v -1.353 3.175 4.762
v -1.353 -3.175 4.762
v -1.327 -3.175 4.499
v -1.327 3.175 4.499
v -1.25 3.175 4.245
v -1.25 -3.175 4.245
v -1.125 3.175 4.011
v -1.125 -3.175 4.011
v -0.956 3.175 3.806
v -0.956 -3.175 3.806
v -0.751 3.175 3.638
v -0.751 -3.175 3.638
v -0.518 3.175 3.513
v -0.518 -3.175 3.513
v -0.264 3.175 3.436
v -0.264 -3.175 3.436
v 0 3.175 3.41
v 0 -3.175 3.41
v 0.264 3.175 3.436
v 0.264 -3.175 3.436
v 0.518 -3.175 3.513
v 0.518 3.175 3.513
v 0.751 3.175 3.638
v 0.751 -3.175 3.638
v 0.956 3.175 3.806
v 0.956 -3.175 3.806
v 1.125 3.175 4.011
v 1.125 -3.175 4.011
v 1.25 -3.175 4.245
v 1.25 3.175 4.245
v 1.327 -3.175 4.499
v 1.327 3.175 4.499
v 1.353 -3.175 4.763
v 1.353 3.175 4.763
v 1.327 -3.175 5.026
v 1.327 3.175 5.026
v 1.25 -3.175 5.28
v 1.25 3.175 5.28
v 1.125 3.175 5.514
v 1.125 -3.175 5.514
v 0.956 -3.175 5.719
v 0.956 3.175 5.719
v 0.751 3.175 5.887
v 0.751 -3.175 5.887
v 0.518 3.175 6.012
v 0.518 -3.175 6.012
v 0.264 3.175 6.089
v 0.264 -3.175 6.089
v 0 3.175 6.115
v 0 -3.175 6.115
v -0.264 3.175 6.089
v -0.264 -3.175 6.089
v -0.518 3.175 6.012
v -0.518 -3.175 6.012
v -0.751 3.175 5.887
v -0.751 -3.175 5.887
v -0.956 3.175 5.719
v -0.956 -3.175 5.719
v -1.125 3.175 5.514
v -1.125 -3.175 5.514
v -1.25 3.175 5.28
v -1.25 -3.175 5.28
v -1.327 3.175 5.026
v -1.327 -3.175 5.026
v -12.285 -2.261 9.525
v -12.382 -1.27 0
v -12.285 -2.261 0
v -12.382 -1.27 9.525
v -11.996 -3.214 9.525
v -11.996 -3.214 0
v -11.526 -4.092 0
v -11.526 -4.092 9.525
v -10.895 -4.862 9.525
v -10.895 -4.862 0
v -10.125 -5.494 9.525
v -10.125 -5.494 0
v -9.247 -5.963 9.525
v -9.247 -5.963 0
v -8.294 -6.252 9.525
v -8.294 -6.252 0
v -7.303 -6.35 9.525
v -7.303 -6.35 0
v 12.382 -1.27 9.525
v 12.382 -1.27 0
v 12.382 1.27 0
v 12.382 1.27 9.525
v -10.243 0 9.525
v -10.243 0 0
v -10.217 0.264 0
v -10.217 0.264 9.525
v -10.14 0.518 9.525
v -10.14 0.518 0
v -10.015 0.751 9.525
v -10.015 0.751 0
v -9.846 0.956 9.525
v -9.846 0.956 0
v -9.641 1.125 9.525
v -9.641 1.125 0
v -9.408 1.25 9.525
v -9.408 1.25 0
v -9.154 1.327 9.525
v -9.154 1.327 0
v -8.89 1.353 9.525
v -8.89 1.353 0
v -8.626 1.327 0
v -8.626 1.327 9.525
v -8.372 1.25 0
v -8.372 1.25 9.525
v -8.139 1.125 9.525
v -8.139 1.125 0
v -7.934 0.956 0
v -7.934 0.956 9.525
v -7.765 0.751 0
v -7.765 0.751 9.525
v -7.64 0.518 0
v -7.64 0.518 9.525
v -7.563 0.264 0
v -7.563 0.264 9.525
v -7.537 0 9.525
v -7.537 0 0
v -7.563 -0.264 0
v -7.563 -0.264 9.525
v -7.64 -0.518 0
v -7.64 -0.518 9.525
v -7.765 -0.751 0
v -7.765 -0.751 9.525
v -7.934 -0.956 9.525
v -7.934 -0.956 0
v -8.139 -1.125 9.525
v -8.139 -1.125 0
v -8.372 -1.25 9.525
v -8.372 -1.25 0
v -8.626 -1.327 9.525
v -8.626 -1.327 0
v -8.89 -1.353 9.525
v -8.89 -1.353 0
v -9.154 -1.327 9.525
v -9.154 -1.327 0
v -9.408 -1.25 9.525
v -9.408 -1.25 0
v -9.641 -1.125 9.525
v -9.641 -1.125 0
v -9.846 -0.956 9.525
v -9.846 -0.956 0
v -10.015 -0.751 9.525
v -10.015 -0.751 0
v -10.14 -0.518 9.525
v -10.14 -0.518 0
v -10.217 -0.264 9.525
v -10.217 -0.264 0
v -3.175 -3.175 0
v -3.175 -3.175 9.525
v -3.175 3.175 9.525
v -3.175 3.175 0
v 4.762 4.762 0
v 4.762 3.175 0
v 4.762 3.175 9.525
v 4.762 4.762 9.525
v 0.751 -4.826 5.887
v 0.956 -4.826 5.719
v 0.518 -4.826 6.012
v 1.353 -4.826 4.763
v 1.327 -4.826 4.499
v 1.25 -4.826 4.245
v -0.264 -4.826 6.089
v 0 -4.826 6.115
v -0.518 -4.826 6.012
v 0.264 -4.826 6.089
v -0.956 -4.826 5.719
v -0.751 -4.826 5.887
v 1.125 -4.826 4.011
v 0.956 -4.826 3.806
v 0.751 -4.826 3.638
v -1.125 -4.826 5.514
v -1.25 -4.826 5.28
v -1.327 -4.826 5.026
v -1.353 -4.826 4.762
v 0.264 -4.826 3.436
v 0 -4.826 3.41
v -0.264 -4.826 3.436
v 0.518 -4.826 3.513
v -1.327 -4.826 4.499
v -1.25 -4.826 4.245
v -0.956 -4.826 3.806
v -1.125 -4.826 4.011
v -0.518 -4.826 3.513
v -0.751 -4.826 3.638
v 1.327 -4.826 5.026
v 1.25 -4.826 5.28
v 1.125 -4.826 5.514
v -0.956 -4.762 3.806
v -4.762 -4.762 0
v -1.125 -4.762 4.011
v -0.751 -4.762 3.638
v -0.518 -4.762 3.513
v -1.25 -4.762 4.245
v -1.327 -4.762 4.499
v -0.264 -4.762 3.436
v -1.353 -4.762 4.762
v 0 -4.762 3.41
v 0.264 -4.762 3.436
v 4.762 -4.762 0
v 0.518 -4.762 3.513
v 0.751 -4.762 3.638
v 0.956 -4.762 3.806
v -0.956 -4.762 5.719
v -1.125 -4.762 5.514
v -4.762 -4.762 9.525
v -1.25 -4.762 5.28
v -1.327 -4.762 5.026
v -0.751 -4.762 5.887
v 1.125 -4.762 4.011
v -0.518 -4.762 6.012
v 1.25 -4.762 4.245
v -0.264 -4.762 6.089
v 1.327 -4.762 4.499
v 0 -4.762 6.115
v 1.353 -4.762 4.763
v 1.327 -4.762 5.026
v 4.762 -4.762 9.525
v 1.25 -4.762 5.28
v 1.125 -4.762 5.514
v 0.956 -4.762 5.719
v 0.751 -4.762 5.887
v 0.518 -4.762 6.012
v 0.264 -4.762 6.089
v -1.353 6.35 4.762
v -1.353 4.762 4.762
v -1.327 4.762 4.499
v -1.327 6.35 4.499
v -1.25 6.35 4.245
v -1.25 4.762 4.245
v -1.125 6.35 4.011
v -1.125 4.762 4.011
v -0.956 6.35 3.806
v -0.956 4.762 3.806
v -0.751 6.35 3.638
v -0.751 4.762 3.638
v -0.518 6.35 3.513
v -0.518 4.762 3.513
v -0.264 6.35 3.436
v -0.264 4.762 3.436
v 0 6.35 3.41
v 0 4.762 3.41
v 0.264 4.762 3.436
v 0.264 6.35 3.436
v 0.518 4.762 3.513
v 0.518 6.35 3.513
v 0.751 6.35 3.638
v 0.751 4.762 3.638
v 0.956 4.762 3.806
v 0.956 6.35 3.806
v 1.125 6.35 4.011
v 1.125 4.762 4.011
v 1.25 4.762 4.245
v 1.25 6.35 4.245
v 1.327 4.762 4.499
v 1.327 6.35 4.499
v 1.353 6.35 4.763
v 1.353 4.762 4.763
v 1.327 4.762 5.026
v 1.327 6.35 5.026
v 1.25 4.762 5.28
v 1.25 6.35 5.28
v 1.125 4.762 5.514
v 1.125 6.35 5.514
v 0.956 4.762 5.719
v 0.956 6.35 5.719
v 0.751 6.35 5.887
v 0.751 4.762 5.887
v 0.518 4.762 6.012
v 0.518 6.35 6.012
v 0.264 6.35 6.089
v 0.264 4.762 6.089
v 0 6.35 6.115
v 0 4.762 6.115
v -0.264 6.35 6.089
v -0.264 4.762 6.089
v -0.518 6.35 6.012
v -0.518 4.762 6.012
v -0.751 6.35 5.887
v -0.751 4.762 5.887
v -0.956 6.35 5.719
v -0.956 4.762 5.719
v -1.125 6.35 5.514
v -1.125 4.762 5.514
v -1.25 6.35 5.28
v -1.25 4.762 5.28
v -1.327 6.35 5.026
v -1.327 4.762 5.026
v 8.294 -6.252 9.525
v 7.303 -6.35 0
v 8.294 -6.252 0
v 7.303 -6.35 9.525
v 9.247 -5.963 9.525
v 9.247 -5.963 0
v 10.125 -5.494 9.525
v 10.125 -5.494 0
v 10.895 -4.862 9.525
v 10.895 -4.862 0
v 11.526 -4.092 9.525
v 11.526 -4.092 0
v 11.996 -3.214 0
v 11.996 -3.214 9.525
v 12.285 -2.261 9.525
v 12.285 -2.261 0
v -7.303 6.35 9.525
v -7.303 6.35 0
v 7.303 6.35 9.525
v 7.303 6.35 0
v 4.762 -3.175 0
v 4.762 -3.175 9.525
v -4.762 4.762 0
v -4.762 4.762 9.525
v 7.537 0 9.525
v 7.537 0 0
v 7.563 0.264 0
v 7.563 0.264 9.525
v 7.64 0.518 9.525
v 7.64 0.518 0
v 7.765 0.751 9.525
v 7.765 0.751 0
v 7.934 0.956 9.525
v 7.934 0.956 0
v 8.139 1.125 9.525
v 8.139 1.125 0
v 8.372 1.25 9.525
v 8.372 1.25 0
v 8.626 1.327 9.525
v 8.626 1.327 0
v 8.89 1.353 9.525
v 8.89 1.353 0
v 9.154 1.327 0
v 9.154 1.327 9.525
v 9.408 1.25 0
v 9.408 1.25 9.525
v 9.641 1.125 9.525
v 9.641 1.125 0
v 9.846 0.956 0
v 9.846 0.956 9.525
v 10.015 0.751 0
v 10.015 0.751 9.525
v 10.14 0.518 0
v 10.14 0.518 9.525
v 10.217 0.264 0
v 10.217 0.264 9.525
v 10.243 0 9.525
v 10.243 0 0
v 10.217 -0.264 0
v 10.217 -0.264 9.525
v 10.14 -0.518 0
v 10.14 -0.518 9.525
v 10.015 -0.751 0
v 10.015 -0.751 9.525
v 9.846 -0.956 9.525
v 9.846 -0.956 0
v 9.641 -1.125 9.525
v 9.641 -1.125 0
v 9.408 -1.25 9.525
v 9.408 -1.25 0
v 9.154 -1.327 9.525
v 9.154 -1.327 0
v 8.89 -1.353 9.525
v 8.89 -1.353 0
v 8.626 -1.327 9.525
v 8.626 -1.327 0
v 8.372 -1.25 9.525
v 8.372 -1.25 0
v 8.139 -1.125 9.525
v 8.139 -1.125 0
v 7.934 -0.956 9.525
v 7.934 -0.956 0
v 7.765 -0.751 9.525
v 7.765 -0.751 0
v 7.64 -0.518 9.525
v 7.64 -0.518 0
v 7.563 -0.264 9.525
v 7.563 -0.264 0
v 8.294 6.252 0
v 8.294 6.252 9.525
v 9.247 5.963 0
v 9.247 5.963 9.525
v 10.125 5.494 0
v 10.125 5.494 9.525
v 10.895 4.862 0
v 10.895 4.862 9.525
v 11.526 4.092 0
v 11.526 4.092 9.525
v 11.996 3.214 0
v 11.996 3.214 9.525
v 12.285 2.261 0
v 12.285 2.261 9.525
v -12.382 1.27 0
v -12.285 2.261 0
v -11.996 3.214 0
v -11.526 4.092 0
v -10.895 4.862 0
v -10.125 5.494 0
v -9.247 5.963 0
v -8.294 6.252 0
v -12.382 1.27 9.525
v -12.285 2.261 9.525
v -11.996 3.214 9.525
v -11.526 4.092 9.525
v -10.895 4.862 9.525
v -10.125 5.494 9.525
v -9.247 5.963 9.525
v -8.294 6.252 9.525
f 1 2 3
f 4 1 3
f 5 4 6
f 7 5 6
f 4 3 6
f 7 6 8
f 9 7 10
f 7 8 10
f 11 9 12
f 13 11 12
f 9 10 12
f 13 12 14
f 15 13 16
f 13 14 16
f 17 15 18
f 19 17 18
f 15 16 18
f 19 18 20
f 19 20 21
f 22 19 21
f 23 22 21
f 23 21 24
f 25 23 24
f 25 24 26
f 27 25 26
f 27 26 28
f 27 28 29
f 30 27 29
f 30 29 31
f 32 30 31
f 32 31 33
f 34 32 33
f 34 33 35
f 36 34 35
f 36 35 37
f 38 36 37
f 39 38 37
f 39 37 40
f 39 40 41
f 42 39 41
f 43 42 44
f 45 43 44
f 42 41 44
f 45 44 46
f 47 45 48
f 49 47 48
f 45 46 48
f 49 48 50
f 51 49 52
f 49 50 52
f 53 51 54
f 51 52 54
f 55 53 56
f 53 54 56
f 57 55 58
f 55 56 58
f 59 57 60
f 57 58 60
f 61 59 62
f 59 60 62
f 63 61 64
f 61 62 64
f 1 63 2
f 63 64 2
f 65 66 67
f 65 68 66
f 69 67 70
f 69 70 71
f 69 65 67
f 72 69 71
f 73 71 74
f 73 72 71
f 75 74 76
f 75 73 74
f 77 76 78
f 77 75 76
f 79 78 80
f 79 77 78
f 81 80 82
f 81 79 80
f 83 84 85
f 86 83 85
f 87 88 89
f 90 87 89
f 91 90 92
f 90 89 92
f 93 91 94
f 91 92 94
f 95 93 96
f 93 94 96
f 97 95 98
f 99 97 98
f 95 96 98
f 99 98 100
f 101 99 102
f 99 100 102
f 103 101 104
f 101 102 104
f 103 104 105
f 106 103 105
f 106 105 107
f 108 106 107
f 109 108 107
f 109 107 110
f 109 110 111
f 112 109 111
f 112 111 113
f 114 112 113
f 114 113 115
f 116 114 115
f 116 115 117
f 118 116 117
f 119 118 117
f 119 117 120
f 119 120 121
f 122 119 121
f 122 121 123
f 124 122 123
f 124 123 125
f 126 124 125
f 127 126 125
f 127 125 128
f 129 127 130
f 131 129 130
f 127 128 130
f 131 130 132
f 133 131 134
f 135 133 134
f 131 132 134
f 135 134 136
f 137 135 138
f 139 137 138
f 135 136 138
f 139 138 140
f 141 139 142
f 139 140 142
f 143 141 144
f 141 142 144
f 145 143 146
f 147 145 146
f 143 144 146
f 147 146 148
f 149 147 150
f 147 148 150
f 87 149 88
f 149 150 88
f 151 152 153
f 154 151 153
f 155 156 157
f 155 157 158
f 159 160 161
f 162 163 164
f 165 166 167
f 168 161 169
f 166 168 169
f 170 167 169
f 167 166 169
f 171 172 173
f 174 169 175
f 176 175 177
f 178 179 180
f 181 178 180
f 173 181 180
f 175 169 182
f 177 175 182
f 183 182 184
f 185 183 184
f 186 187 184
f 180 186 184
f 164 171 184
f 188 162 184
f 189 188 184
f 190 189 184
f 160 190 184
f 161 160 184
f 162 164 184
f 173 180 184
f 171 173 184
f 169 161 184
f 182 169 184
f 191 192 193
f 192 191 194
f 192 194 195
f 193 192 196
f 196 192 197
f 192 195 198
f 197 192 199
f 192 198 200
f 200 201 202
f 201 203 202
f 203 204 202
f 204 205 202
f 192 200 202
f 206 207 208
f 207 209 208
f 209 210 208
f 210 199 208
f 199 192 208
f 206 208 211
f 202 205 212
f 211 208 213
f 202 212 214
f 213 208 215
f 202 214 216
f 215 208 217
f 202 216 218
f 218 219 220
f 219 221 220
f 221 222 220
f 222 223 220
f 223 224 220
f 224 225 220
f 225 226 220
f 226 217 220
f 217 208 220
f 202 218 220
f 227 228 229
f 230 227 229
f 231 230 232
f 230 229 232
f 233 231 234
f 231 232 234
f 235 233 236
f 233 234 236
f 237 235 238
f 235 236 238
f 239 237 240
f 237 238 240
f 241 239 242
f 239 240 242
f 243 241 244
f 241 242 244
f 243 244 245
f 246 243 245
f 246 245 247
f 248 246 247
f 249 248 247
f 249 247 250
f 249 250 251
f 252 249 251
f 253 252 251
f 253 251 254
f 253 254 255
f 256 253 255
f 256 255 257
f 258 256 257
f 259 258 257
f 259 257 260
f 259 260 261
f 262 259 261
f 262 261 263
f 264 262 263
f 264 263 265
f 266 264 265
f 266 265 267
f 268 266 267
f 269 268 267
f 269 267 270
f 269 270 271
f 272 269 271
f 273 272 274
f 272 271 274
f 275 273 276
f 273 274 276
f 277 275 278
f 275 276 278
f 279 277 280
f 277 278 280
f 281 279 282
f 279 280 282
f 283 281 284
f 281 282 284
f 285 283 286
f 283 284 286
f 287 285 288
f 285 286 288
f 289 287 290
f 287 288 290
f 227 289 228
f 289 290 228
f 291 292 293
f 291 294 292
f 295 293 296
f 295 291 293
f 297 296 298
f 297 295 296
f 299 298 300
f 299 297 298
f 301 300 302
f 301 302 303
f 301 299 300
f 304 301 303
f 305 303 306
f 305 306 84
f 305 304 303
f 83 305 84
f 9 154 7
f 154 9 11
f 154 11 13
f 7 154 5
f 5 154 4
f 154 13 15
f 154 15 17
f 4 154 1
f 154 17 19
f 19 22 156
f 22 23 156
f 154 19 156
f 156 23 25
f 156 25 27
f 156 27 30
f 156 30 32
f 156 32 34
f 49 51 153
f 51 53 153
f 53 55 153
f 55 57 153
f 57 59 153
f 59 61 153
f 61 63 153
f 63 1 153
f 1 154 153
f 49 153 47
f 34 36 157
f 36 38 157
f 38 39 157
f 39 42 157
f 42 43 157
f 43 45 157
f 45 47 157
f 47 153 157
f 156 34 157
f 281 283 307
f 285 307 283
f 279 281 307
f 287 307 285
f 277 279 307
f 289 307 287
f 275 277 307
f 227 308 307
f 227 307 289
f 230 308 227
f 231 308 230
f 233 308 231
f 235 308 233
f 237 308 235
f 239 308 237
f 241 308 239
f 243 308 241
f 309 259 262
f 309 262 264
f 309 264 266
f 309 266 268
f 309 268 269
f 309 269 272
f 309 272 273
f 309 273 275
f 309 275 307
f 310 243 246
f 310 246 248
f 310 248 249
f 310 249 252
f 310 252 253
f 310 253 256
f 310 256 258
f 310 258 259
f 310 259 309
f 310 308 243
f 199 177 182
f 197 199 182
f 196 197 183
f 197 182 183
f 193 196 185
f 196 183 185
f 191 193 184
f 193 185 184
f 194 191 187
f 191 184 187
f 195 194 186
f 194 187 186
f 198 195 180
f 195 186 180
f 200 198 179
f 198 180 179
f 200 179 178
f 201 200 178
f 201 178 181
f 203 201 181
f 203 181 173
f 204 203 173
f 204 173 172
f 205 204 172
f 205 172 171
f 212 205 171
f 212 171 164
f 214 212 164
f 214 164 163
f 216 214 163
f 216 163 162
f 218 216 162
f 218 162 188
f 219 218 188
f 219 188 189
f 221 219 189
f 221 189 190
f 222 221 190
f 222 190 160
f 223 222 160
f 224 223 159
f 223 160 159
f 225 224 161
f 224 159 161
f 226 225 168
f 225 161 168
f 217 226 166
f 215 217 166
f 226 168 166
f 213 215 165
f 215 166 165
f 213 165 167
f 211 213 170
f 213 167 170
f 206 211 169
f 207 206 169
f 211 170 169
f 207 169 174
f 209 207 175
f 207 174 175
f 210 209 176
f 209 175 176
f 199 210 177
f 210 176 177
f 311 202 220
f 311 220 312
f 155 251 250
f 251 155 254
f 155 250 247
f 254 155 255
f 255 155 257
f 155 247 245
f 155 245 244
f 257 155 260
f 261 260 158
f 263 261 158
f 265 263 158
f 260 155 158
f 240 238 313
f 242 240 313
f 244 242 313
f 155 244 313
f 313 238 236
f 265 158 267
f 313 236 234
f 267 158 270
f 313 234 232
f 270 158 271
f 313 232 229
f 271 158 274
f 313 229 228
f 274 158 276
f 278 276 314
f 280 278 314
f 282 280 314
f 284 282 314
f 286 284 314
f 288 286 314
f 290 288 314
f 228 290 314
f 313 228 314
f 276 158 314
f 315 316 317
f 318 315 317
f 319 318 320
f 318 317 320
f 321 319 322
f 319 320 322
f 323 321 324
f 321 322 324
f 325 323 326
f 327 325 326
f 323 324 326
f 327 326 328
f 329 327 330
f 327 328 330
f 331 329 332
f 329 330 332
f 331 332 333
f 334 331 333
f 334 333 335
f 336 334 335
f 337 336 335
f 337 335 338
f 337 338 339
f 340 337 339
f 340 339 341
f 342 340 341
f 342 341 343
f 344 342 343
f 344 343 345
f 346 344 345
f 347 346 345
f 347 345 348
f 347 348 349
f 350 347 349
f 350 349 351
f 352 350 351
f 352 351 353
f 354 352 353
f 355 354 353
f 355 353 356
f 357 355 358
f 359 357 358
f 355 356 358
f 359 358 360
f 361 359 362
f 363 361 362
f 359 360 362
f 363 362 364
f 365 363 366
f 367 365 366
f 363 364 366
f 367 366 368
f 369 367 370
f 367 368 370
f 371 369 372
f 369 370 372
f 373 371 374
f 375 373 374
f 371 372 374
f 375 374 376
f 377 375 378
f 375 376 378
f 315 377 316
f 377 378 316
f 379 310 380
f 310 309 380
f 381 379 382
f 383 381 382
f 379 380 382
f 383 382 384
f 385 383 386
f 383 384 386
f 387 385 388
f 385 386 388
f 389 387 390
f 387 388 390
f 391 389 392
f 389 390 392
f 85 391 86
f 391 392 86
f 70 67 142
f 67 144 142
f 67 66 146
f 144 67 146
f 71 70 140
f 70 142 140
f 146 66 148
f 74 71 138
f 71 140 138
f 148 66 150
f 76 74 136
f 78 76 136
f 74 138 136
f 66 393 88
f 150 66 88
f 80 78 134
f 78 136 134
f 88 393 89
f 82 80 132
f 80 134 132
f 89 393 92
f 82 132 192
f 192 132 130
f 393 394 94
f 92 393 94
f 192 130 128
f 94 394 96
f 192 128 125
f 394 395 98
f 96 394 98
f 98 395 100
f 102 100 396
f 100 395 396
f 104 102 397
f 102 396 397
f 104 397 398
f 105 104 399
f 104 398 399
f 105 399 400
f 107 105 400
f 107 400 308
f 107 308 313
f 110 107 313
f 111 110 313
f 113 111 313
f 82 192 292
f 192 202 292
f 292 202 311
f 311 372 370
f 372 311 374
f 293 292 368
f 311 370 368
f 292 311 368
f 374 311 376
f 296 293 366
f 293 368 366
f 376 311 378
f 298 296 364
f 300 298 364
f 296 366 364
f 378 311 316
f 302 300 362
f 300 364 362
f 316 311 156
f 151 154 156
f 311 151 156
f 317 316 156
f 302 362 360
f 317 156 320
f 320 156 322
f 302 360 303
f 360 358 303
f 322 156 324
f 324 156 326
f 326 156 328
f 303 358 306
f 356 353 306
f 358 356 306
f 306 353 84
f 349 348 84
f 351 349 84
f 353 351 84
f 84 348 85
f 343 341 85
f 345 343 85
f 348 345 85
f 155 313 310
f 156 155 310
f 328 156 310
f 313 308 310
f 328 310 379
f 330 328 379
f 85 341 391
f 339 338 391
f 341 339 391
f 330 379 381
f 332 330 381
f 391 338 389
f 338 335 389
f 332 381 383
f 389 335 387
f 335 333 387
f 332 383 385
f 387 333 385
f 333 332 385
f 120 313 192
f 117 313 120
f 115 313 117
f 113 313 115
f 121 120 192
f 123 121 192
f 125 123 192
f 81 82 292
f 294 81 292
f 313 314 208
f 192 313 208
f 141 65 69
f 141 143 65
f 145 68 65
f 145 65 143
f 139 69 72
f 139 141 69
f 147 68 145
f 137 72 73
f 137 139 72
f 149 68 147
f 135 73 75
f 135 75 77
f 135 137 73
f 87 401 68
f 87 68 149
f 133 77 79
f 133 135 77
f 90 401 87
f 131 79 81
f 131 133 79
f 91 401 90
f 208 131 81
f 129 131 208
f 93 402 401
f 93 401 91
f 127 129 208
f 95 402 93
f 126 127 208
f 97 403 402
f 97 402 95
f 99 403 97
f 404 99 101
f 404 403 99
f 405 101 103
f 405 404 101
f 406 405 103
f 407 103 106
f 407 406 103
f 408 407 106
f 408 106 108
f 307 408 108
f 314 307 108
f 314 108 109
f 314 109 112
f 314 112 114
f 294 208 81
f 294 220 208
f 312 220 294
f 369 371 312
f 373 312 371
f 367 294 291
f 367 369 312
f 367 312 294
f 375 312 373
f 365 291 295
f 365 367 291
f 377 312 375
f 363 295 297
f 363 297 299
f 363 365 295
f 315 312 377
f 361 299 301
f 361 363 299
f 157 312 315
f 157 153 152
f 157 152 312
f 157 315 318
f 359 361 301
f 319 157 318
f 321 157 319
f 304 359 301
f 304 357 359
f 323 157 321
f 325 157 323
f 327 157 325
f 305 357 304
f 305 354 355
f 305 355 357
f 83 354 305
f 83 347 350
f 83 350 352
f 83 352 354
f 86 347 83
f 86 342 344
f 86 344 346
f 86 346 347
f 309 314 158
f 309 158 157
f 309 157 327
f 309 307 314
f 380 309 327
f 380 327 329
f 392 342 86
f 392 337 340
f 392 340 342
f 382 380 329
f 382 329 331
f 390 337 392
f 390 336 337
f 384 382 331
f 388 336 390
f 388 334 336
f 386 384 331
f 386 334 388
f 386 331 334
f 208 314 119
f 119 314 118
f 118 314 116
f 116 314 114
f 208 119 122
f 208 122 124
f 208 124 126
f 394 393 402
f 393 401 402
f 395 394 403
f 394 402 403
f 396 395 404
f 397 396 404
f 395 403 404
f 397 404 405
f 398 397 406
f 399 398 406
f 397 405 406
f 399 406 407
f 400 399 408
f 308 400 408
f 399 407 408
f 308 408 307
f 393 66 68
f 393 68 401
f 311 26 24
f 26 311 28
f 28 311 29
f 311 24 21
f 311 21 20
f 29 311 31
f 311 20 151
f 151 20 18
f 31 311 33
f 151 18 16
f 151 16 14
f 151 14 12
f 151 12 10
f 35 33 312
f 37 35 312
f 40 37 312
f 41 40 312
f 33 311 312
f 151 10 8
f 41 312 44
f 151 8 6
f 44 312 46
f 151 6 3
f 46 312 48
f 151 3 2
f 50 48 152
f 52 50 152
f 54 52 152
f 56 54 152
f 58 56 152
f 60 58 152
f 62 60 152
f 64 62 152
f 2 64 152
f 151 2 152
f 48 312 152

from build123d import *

# Parameters (mm, degrees)
SKETCH1_W                 = 24.765
SKETCH1_H                 = 12.7
BOSS_EXTRUDE1_DEPTH       = 9.525
CUT_EXTRUDE1_DEPTH        = 10.525
FILLET1_R                 = 5.08
F_6_32_TAPPED_HOLE2_D     = 2.7051
F_6_32_TAPPED_HOLE1_D     = 2.7051
F_6_32_TAPPED_HOLE1_DEPTH = 11.176


with BuildPart() as part:
    # Sketch1 → Boss-Extrude1 (new body)
    with BuildSketch(Plane.XY):
        Rectangle(SKETCH1_W, SKETCH1_H)
    extrude(amount=BOSS_EXTRUDE1_DEPTH)

    # Sketch2 → Cut-Extrude1 (cut, through all)
    with BuildSketch(Plane.XY.offset(9.525)):
        Polygon((4.7625, 4.7625), (-4.7625, 4.7625), (-4.7625, -4.7625), (4.7625, -4.7625), (4.7625, -3.175), (-3.175, -3.175), (-3.175, 3.175), (4.7625, 3.175), align=None)
    extrude(amount=-CUT_EXTRUDE1_DEPTH, mode=Mode.SUBTRACT)

    # Fillet1
    fillet1_edges = [part.edges().sort_by_distance(p)[0] for p in [
        (-12.3825, 6.35, 4.7625),
        (12.3825, 6.35, 4.7625),
        (12.3825, -6.35, 4.7625),
        (-12.3825, -6.35, 4.7625),
    ]]
    fillet(fillet1_edges, radius=FILLET1_R)

    # #6-32 Tapped Hole2 (through all)
    with Locations(Plane.XY.offset(9.525)):
        with Locations((-8.89, 0), (8.89, 0)):
            Hole(F_6_32_TAPPED_HOLE2_D / 2)

    # #6-32 Tapped Hole1
    with Locations(Plane(origin=(0, 6.35, 0), x_dir=(1, 0, 0), z_dir=(0, 1, 0))):
        with Locations((0, -4.7625)):
            Hole(F_6_32_TAPPED_HOLE1_D / 2, depth=F_6_32_TAPPED_HOLE1_DEPTH)


solid = part.part
